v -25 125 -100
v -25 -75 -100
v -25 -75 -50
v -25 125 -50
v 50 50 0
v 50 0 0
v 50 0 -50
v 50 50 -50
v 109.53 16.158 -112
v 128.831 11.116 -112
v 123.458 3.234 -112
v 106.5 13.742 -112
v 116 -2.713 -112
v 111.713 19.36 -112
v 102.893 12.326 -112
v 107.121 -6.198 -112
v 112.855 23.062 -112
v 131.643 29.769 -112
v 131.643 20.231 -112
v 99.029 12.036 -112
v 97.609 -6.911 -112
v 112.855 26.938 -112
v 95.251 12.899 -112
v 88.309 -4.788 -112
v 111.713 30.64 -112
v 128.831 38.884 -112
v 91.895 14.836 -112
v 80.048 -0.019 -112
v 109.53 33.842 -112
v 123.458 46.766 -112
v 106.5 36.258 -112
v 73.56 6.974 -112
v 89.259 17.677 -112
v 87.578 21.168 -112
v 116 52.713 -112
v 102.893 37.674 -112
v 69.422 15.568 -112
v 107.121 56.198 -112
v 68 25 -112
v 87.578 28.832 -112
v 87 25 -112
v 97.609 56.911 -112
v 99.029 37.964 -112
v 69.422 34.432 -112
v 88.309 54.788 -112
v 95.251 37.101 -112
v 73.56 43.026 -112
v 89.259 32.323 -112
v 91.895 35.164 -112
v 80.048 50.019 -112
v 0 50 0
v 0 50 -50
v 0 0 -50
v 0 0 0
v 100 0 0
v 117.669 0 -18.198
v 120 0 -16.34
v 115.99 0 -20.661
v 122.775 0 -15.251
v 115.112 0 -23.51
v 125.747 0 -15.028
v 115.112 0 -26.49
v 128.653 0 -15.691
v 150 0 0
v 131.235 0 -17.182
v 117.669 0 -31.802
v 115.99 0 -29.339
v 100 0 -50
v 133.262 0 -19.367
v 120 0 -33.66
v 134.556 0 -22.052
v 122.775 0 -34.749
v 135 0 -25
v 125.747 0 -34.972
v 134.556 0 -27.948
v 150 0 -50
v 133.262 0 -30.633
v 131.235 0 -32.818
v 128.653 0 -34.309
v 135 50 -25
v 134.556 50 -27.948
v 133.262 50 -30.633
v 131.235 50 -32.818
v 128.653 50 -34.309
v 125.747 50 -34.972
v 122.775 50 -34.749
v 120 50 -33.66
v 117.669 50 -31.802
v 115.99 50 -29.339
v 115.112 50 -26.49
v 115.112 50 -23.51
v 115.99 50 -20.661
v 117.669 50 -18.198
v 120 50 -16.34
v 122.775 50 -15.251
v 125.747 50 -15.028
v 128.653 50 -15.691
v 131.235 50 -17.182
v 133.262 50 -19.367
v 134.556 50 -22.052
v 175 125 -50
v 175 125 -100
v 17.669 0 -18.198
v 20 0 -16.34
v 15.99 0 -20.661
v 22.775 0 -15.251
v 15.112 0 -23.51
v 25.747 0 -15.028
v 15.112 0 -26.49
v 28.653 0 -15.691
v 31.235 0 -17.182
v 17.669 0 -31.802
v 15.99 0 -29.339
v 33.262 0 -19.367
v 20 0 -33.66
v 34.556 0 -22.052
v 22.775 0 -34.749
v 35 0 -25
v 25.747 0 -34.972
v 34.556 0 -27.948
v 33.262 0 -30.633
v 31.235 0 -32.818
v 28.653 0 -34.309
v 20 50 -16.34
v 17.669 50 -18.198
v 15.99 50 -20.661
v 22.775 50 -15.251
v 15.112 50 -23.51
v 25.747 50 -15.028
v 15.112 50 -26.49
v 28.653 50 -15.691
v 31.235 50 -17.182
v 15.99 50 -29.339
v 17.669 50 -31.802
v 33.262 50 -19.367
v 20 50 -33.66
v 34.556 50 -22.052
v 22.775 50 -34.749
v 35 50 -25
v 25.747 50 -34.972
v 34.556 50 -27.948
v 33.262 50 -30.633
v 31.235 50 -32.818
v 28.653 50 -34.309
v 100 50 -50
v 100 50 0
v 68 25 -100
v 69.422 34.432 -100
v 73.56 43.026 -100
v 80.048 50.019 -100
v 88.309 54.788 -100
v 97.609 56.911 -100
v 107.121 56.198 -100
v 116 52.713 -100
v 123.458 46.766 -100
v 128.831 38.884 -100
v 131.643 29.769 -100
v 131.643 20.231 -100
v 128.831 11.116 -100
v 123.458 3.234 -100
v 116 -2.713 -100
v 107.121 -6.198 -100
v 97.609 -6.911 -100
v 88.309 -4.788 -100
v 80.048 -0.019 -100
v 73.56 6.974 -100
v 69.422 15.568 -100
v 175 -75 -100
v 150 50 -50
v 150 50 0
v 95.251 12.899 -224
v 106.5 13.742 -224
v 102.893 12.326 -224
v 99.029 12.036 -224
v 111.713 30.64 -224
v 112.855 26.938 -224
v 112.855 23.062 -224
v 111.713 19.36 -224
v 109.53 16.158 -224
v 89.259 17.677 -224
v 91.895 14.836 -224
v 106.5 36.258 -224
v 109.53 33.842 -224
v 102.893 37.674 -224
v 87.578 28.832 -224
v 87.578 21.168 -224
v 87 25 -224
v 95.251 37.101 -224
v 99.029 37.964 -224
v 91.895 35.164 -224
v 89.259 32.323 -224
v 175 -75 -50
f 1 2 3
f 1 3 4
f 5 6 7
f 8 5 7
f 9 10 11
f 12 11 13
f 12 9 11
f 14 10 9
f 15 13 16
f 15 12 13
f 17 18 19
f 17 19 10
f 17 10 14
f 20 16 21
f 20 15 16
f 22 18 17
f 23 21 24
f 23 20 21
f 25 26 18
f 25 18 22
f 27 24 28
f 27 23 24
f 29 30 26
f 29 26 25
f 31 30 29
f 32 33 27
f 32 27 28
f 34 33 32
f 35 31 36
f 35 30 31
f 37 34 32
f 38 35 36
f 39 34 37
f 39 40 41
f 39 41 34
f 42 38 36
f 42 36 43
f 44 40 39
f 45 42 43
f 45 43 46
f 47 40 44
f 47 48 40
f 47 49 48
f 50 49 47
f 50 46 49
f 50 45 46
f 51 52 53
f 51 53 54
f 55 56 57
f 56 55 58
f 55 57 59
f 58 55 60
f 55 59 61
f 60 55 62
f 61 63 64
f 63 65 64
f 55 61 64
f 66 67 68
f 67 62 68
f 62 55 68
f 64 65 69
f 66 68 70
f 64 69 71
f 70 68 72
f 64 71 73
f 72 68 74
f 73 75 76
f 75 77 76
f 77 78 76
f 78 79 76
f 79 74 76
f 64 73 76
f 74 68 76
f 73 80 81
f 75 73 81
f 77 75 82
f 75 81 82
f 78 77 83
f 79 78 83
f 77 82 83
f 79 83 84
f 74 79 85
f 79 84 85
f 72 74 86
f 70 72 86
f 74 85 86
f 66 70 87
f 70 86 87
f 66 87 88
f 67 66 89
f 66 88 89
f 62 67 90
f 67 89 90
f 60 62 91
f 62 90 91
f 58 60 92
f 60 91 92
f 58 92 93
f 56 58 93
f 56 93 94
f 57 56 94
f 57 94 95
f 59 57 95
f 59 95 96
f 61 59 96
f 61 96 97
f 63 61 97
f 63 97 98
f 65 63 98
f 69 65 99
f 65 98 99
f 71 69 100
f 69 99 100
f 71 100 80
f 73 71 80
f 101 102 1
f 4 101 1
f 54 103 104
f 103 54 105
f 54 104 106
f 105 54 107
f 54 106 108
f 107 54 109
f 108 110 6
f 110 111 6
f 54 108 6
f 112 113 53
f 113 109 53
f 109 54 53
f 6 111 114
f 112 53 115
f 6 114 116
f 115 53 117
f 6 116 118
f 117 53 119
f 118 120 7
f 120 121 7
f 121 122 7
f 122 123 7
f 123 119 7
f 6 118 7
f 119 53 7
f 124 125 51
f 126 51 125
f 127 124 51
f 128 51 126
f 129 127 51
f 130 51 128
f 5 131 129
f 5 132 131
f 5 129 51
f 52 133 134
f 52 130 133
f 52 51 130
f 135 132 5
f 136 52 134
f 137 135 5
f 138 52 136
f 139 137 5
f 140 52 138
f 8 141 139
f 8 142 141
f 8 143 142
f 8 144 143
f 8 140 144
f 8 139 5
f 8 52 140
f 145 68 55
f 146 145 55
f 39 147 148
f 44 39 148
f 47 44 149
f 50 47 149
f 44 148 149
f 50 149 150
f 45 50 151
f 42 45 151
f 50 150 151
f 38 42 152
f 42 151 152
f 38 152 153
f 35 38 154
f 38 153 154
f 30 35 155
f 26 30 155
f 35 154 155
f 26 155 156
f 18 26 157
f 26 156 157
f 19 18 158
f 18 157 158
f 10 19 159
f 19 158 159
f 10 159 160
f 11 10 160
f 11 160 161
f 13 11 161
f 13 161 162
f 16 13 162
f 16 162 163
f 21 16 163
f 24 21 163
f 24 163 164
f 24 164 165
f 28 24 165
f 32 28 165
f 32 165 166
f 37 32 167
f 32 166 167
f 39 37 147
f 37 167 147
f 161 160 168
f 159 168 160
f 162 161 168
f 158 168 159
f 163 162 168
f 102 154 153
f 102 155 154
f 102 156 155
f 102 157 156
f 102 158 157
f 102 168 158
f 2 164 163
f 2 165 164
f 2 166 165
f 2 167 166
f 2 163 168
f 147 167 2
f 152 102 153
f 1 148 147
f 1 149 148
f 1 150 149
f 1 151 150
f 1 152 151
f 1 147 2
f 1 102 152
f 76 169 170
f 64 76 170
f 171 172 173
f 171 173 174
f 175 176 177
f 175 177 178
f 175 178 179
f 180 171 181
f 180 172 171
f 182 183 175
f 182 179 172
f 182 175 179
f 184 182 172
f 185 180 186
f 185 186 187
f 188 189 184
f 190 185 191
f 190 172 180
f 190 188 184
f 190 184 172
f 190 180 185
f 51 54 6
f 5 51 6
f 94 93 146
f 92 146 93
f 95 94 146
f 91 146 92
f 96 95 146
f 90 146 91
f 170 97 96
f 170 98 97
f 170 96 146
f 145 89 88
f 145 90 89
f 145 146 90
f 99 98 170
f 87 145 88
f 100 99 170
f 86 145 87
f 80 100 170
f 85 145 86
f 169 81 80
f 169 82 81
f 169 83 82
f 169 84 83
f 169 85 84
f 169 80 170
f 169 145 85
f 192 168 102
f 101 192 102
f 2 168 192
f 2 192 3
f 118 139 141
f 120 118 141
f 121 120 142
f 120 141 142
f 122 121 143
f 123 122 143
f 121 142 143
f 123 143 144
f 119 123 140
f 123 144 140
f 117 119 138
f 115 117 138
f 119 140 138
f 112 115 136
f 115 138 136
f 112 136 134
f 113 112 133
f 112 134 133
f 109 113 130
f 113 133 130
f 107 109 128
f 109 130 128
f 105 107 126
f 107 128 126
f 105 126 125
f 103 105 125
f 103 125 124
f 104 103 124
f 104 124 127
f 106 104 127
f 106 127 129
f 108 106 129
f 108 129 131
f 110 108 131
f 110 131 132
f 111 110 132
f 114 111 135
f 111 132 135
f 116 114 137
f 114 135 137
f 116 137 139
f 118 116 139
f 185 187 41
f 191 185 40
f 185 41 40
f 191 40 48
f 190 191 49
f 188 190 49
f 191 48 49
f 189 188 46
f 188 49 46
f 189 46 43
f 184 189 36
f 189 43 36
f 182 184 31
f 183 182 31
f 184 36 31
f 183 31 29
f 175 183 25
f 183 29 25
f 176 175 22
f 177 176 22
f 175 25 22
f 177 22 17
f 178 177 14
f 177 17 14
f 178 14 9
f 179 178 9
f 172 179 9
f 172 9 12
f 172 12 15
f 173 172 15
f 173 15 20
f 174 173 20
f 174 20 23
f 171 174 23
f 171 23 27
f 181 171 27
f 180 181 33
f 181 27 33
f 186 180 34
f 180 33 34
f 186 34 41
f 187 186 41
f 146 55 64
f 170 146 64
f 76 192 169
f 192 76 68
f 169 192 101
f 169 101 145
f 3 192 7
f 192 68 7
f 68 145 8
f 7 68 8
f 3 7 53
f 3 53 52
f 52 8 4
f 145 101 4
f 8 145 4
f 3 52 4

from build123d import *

# Parameters (mm, degrees)
BOSS_EXTRUDE1_DEPTH = 50
SKETCH3_R           = 10
CUT_EXTRUDE1_DEPTH  = 50
SKETCH4_W           = 150
SKETCH4_H           = 50
BOSS_EXTRUDE2_DEPTH = 50
SKETCH5_W           = 150
SKETCH5_H           = 50
BOSS_EXTRUDE3_DEPTH = 50
SKETCH6_W           = 200
SKETCH6_H           = 200
SKETCH6_W_2         = 150
SKETCH6_H_2         = 150
BOSS_EXTRUDE4_DEPTH = 50
SKETCH7_R           = 32
BOSS_EXTRUDE5_DEPTH = 12
SKETCH8_R           = 13
BOSS_EXTRUDE6_DEPTH = 112


with BuildPart() as part:
    # Sketch2 → Boss-Extrude1 (new body)
    with BuildSketch(Plane(origin=(0, 0, 0), x_dir=(1, 0, 0), z_dir=(0, 1, 0))):
        Polygon((0, 100), (0, 0), (50, 0), (50, 50), (100, 50), (100, 0), (150, 0), (150, 100), align=None)
    extrude(amount=BOSS_EXTRUDE1_DEPTH)

    # Sketch3 → Cut-Extrude1 (cut)
    with BuildSketch(Plane(origin=(0, 50, 0), x_dir=(1, 0, 0), z_dir=(0, 1, 0))):
        with Locations((125, 25)):
            Circle(SKETCH3_R)
        with Locations((25, 25)):
            Circle(SKETCH3_R)
    extrude(amount=-CUT_EXTRUDE1_DEPTH, mode=Mode.SUBTRACT)

    # Sketch4 → Boss-Extrude2 (add)
    with BuildSketch(Plane(origin=(0, 50, 0), x_dir=(1, 0, 0), z_dir=(0, 1, 0))):
        with Locations((75, 75)):
            Rectangle(SKETCH4_W, SKETCH4_H)
    extrude(amount=BOSS_EXTRUDE2_DEPTH)

    # Sketch5 → Boss-Extrude3 (add)
    with BuildSketch(Plane.XZ):
        with Locations((75, -75)):
            Rectangle(SKETCH5_W, SKETCH5_H)
    extrude(amount=BOSS_EXTRUDE3_DEPTH)

    # Sketch6 → Boss-Extrude4 (add)
    with BuildSketch(Plane(origin=(0, 0, -100), x_dir=(-1, 0, 0), z_dir=(0, 0, -1))):
        with Locations((-75, 25)):
            Rectangle(SKETCH6_W, SKETCH6_H)
        with Locations((-75, 25)):
            Rectangle(SKETCH6_W_2, SKETCH6_H_2, mode=Mode.SUBTRACT)
    extrude(amount=-BOSS_EXTRUDE4_DEPTH)

    # Sketch7 → Boss-Extrude5 (add)
    with BuildSketch(Plane(origin=(0, 0, -100), x_dir=(-1, 0, 0), z_dir=(0, 0, -1))):
        with Locations((-100, 25)):
            Circle(SKETCH7_R)
    extrude(amount=BOSS_EXTRUDE5_DEPTH)

    # Sketch8 → Boss-Extrude6 (add)
    with BuildSketch(Plane(origin=(0, 0, -112), x_dir=(-1, 0, 0), z_dir=(0, 0, -1))):
        with Locations((-100, 25)):
            Circle(SKETCH8_R)
    extrude(amount=BOSS_EXTRUDE6_DEPTH)


solid = part.part
